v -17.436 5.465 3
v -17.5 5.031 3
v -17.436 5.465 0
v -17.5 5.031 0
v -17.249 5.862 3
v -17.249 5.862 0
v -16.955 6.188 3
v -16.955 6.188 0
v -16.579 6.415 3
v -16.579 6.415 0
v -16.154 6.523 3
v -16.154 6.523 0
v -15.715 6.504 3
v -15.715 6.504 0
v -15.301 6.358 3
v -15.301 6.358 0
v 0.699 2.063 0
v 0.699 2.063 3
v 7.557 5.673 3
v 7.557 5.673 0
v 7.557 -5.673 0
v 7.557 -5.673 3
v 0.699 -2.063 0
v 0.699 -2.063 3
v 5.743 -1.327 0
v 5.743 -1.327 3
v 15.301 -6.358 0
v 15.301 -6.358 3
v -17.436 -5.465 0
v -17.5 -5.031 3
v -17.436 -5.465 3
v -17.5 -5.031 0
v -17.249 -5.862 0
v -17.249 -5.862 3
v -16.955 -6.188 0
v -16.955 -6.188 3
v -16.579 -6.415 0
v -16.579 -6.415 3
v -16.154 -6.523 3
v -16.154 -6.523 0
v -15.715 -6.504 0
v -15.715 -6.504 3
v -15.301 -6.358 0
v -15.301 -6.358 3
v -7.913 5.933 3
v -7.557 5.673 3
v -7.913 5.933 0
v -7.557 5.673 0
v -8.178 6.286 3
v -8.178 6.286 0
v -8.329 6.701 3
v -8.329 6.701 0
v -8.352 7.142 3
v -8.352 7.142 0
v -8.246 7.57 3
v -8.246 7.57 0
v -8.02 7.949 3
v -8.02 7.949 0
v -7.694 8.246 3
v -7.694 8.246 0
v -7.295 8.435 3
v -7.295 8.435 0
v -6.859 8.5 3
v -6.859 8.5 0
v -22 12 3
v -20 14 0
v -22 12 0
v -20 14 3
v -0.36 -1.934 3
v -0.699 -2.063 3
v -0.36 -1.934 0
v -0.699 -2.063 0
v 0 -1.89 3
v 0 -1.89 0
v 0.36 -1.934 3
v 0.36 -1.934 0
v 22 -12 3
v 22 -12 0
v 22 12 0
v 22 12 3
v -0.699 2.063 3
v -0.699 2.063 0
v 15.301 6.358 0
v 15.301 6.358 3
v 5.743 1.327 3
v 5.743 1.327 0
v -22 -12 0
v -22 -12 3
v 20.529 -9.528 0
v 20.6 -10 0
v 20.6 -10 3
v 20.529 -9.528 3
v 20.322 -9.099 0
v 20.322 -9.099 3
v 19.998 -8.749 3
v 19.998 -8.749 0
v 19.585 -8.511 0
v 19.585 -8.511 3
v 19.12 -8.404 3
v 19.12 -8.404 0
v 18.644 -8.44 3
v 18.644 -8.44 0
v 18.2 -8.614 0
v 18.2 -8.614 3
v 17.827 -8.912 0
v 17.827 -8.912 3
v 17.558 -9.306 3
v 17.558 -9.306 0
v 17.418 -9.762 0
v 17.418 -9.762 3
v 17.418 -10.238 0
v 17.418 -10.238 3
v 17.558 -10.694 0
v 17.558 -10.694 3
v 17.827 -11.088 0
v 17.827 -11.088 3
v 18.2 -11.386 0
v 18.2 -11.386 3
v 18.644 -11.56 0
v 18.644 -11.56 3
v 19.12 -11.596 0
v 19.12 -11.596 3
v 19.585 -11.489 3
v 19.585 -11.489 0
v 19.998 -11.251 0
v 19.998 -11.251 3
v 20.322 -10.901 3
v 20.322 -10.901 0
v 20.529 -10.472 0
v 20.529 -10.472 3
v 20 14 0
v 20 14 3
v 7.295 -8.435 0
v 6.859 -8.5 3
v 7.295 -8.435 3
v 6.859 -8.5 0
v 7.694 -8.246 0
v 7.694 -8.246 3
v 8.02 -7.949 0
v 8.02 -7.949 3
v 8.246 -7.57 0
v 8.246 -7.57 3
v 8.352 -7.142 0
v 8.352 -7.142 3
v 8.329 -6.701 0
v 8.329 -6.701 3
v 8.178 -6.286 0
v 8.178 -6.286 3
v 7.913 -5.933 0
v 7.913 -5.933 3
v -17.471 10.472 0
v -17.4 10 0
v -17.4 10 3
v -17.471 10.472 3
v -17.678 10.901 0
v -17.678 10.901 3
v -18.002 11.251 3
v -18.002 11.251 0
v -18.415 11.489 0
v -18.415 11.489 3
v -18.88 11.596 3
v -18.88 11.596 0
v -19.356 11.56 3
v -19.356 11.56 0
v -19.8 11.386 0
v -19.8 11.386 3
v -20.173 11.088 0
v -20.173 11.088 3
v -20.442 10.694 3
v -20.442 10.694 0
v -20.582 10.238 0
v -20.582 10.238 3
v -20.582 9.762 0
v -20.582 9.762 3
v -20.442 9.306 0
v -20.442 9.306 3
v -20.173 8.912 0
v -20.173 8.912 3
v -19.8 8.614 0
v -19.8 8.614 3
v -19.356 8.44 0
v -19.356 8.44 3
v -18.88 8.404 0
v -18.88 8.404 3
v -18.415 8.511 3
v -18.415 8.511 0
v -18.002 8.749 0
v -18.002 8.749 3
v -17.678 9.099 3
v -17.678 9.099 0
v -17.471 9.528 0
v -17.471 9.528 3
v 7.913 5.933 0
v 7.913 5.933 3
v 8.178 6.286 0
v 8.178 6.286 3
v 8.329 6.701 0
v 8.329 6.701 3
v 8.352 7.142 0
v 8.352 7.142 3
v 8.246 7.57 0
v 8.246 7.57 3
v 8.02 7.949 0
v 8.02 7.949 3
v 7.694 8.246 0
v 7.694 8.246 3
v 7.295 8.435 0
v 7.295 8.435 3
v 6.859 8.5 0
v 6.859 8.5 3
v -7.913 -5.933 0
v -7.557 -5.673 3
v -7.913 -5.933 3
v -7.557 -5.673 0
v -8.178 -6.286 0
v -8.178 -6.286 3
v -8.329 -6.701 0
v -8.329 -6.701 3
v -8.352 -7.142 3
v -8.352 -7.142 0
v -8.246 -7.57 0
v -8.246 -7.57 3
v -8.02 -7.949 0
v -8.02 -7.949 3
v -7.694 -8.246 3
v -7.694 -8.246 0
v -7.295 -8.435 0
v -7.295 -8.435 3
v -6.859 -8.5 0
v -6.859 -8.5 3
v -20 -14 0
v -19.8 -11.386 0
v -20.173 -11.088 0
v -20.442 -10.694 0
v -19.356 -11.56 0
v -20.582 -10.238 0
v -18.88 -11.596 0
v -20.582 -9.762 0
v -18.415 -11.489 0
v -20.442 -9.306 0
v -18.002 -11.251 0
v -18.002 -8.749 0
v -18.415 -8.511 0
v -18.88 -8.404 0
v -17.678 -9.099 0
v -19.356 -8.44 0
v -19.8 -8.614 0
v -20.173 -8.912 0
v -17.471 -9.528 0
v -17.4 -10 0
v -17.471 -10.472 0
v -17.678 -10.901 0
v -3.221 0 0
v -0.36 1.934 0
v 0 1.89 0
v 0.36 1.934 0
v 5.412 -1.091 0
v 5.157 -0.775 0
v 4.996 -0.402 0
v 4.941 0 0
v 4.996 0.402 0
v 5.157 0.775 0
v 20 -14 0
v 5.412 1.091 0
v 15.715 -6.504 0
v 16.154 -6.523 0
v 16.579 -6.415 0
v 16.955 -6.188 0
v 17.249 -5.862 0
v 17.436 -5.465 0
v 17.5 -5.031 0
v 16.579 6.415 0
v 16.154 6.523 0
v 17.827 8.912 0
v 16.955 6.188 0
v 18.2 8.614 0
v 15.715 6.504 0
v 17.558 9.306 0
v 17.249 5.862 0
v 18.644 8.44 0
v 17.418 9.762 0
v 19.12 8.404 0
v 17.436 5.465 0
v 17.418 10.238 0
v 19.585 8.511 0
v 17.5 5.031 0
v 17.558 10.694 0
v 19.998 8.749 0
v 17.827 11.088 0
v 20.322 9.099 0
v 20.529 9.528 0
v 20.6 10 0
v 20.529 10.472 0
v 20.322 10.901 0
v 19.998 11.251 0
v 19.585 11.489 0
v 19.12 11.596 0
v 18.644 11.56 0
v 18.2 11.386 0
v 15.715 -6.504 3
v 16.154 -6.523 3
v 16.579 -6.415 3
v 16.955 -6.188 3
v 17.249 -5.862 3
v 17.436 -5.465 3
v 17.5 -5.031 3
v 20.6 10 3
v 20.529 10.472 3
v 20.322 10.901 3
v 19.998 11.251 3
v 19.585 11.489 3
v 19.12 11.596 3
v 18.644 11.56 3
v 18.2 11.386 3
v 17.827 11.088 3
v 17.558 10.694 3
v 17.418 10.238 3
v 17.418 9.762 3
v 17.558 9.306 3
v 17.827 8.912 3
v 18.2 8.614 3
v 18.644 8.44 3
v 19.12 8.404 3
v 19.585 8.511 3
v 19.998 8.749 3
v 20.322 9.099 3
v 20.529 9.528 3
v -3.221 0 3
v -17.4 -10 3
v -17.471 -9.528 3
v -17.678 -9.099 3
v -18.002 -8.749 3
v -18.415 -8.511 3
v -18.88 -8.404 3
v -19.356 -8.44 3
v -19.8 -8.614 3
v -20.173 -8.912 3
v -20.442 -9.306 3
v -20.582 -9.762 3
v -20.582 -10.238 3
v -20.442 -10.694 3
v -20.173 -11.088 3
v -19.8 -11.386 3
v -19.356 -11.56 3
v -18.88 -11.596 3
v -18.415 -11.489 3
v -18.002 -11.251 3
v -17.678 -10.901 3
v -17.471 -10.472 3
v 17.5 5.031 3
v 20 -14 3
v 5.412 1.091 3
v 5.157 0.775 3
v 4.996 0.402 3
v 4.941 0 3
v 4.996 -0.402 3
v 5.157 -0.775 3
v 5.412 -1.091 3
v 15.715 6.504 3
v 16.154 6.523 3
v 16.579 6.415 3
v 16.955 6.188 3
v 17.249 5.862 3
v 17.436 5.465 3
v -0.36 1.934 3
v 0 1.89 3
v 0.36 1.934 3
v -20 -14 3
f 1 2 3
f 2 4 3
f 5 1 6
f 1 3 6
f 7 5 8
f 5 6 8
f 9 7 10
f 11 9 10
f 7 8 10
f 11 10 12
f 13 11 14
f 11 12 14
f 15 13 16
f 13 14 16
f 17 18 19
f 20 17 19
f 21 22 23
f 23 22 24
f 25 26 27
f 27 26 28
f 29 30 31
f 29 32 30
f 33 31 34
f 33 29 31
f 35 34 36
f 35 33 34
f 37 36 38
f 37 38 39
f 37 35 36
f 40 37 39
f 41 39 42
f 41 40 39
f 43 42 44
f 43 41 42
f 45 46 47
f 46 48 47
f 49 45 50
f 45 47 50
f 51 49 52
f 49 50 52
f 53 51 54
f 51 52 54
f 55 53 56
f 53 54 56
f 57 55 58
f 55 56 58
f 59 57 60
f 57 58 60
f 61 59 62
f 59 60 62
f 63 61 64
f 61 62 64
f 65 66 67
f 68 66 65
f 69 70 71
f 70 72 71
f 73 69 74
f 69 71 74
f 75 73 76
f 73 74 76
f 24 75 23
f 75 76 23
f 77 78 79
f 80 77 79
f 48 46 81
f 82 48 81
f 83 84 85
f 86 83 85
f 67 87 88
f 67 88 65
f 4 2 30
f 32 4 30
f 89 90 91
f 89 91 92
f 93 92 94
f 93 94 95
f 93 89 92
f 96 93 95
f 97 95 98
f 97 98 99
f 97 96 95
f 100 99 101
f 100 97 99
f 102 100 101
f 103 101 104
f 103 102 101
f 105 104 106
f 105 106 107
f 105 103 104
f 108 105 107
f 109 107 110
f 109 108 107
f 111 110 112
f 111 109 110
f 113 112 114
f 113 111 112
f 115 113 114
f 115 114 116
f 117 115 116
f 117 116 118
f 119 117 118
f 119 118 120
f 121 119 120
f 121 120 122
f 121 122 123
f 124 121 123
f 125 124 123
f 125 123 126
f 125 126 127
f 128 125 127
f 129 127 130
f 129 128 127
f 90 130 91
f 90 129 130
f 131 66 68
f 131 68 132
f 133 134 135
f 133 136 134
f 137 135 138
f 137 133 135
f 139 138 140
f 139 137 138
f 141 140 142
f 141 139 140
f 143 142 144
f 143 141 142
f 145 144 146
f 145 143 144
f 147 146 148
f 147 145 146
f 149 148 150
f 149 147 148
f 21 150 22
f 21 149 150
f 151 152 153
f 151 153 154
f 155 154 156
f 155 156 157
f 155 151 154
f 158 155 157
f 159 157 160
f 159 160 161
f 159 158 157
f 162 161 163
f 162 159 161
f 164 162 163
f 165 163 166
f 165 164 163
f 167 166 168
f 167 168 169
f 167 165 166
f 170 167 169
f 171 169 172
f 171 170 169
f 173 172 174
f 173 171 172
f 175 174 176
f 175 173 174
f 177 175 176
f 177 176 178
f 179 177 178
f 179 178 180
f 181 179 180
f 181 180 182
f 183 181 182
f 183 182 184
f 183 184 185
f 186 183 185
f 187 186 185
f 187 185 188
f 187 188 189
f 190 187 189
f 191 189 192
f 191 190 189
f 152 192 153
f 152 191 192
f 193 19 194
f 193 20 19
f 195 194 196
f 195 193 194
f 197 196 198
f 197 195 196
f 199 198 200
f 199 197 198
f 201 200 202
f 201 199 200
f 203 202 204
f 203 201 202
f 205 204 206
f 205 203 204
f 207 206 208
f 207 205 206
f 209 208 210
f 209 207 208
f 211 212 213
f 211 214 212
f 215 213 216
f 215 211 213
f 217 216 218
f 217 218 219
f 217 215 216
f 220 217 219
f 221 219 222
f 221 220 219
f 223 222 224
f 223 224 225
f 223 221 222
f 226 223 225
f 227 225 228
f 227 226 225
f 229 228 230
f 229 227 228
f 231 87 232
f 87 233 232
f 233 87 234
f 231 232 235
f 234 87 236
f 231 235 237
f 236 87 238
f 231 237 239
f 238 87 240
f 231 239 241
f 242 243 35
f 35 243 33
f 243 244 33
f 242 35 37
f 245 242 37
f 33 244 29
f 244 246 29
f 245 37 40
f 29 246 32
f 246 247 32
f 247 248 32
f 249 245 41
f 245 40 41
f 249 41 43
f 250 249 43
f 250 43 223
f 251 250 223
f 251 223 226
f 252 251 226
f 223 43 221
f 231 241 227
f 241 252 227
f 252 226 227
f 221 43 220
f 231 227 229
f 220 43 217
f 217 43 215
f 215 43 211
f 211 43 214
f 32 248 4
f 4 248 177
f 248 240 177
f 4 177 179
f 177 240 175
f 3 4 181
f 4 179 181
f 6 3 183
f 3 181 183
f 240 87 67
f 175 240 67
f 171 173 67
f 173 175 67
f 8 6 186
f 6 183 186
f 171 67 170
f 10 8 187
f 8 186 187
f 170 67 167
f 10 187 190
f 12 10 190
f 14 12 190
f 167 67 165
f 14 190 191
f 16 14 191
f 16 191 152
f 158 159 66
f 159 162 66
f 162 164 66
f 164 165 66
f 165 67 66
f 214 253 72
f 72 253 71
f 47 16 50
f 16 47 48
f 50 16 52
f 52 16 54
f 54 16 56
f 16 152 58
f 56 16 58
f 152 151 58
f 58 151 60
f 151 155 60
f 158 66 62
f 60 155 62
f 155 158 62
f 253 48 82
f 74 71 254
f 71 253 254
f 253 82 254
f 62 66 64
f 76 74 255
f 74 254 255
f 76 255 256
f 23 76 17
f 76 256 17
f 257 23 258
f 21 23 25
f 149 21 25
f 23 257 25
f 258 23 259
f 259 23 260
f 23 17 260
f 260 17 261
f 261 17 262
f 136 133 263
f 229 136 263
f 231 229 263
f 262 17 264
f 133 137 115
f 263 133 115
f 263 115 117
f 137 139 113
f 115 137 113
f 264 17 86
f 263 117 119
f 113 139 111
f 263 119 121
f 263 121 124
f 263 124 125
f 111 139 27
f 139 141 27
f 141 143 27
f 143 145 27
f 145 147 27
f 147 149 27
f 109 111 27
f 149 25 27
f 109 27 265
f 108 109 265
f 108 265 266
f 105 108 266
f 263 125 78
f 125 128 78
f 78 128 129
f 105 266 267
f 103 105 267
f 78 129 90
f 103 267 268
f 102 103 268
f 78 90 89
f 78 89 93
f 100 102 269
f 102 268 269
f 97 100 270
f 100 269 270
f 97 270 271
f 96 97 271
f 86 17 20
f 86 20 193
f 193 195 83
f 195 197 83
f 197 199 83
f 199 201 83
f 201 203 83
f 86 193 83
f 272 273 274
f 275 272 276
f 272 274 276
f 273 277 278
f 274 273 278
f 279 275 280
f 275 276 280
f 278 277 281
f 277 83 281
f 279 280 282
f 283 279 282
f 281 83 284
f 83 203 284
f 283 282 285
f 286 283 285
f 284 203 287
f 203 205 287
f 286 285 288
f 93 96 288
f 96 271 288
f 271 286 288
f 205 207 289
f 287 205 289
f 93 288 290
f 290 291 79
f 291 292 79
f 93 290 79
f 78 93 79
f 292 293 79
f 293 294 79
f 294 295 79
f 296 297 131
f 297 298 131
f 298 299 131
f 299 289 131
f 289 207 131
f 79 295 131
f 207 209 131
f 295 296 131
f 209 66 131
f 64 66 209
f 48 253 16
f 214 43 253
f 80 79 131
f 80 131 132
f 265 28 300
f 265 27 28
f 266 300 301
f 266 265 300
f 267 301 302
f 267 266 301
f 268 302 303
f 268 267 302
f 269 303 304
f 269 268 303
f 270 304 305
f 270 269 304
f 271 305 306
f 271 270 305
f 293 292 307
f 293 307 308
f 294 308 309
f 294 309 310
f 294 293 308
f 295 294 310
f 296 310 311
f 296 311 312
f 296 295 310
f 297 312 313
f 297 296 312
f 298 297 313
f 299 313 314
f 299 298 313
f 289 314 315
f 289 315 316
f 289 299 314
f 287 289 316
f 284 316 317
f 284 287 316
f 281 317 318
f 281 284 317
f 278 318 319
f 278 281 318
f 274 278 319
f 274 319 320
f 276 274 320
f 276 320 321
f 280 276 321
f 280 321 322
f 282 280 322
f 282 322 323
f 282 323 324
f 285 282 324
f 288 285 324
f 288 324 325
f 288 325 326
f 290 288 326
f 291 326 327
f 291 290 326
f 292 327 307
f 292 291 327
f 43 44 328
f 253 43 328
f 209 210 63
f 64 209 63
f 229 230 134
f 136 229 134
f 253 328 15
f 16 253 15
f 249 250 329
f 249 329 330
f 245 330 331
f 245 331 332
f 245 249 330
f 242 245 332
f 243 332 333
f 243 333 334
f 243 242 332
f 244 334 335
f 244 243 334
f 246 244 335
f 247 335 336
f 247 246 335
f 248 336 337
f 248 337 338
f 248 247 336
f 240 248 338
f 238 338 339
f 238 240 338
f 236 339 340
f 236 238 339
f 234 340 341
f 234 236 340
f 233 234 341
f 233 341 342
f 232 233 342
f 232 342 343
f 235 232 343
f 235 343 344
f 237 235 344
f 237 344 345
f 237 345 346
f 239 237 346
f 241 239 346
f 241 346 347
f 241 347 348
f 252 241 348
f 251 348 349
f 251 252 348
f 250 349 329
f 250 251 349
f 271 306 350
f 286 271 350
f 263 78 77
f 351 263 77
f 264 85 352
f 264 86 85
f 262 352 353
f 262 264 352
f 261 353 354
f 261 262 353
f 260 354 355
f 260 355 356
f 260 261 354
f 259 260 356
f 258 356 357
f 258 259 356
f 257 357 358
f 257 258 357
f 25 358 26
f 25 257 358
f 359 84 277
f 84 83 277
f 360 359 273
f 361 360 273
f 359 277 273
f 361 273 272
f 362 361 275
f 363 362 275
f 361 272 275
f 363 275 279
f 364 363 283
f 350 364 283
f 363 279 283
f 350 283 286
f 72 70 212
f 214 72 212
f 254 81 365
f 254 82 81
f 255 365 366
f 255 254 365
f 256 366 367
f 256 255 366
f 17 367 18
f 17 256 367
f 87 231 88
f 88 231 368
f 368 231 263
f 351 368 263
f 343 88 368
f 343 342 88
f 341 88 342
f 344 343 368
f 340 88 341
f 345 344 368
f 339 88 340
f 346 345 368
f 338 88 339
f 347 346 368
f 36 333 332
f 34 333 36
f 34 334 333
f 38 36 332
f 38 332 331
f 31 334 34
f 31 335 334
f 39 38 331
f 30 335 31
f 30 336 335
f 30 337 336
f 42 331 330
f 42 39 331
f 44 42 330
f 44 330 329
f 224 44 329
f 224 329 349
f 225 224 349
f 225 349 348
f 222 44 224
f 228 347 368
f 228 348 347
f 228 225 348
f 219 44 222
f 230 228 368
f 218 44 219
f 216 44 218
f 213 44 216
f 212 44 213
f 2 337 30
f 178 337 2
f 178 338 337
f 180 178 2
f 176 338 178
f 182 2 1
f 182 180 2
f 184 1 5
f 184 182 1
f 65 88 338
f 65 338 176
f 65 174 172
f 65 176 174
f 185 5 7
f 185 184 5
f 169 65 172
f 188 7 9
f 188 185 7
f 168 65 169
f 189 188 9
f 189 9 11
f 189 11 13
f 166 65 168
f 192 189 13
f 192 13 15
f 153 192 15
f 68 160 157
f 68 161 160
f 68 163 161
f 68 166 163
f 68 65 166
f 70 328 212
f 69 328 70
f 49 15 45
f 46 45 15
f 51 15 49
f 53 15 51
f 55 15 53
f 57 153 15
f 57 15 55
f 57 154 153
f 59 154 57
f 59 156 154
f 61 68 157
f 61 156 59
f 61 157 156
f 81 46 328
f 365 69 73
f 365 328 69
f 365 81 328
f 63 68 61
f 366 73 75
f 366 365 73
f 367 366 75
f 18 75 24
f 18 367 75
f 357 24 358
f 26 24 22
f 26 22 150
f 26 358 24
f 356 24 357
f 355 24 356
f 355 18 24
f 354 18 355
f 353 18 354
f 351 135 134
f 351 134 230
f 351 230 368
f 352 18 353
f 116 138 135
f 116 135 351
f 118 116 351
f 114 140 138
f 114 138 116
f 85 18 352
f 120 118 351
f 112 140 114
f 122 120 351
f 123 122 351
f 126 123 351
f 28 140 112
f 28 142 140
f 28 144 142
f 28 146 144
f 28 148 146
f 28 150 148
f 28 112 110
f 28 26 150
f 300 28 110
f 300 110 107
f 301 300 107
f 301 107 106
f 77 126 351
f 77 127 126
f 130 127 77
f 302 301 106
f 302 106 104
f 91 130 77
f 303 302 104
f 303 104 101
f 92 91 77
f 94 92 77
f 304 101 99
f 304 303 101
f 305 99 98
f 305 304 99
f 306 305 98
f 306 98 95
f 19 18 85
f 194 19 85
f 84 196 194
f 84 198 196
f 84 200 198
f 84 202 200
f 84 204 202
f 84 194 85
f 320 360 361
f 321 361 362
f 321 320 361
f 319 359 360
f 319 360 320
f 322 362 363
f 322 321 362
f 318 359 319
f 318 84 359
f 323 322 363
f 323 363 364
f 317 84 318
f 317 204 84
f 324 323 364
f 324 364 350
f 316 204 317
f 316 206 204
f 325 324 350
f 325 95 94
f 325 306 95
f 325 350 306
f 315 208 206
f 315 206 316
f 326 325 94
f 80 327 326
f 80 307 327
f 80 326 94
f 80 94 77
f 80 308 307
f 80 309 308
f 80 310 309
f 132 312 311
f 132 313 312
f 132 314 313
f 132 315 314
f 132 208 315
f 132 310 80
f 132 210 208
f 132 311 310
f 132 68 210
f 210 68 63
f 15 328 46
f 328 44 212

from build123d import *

# Parameters (mm, degrees)
SKETCH_1_W          = 44
SKETCH_1_H          = 28
SKETCH_1_R          = 1.6
EXTRUDE_1_DEPTH     = 3
CUT_EXTRUDE_1_DEPTH = 3
FILLET_1_R          = 1.5
CHAMFER_1_SIZE      = 2


with BuildPart() as part:
    # 草图1 → 凸台-拉伸1 (new body)
    with BuildSketch(Plane.XY):
        Rectangle(SKETCH_1_W, SKETCH_1_H)
        with Locations((-19, 10)):
            Circle(SKETCH_1_R, mode=Mode.SUBTRACT)
        with Locations((-19, -10)):
            Circle(SKETCH_1_R, mode=Mode.SUBTRACT)
        with Locations((19, -10)):
            Circle(SKETCH_1_R, mode=Mode.SUBTRACT)
        with Locations((19, 10)):
            Circle(SKETCH_1_R, mode=Mode.SUBTRACT)
    extrude(amount=EXTRUDE_1_DEPTH)

    # 草图2 → 切除-拉伸1 (cut)
    with BuildSketch(Plane.XY.offset(3)):
        Polygon((-17.5, 7.51545443), (-17.5, -7.51545443), (-3.220636583, 0), align=None)
        Polygon((-12.929363417, 8.5), (0, 1.695071886), (12.929363417, 8.5), align=None)
        Polygon((0, -1.695071886), (-12.929363417, -8.5), (12.929363417, -8.5), align=None)
        Polygon((17.5, 7.51545443), (3.220636583, 0), (17.5, -7.51545443), align=None)
    extrude(amount=-CUT_EXTRUDE_1_DEPTH, mode=Mode.SUBTRACT)

    # 圆角1
    fillet_1_edges = [part.edges().sort_by_distance(p)[0] for p in [
        (0, 1.695071886, 1.5),
        (-12.929363417, 8.5, 1.5),
        (12.929363417, 8.5, 1.5),
        (-12.929363417, -8.5, 1.5),
        (0, -1.695071886, 1.5),
        (12.929363417, -8.5, 1.5),
        (3.220636583, 0, 1.5),
        (17.5, 7.51545443, 1.5),
        (17.5, -7.51545443, 1.5),
        (-17.5, 7.51545443, 1.5),
        (-17.5, -7.51545443, 1.5),
    ]]
    fillet(fillet_1_edges, radius=FILLET_1_R)

    # 倒角1
    chamfer_1_edges = [part.edges().sort_by_distance(p)[0] for p in [
        (22, -14, 1.5),
        (-22, -14, 1.5),
        (-22, 14, 1.5),
        (22, 14, 1.5),
    ]]
    chamfer(chamfer_1_edges, length=CHAMFER_1_SIZE)


solid = part.part
